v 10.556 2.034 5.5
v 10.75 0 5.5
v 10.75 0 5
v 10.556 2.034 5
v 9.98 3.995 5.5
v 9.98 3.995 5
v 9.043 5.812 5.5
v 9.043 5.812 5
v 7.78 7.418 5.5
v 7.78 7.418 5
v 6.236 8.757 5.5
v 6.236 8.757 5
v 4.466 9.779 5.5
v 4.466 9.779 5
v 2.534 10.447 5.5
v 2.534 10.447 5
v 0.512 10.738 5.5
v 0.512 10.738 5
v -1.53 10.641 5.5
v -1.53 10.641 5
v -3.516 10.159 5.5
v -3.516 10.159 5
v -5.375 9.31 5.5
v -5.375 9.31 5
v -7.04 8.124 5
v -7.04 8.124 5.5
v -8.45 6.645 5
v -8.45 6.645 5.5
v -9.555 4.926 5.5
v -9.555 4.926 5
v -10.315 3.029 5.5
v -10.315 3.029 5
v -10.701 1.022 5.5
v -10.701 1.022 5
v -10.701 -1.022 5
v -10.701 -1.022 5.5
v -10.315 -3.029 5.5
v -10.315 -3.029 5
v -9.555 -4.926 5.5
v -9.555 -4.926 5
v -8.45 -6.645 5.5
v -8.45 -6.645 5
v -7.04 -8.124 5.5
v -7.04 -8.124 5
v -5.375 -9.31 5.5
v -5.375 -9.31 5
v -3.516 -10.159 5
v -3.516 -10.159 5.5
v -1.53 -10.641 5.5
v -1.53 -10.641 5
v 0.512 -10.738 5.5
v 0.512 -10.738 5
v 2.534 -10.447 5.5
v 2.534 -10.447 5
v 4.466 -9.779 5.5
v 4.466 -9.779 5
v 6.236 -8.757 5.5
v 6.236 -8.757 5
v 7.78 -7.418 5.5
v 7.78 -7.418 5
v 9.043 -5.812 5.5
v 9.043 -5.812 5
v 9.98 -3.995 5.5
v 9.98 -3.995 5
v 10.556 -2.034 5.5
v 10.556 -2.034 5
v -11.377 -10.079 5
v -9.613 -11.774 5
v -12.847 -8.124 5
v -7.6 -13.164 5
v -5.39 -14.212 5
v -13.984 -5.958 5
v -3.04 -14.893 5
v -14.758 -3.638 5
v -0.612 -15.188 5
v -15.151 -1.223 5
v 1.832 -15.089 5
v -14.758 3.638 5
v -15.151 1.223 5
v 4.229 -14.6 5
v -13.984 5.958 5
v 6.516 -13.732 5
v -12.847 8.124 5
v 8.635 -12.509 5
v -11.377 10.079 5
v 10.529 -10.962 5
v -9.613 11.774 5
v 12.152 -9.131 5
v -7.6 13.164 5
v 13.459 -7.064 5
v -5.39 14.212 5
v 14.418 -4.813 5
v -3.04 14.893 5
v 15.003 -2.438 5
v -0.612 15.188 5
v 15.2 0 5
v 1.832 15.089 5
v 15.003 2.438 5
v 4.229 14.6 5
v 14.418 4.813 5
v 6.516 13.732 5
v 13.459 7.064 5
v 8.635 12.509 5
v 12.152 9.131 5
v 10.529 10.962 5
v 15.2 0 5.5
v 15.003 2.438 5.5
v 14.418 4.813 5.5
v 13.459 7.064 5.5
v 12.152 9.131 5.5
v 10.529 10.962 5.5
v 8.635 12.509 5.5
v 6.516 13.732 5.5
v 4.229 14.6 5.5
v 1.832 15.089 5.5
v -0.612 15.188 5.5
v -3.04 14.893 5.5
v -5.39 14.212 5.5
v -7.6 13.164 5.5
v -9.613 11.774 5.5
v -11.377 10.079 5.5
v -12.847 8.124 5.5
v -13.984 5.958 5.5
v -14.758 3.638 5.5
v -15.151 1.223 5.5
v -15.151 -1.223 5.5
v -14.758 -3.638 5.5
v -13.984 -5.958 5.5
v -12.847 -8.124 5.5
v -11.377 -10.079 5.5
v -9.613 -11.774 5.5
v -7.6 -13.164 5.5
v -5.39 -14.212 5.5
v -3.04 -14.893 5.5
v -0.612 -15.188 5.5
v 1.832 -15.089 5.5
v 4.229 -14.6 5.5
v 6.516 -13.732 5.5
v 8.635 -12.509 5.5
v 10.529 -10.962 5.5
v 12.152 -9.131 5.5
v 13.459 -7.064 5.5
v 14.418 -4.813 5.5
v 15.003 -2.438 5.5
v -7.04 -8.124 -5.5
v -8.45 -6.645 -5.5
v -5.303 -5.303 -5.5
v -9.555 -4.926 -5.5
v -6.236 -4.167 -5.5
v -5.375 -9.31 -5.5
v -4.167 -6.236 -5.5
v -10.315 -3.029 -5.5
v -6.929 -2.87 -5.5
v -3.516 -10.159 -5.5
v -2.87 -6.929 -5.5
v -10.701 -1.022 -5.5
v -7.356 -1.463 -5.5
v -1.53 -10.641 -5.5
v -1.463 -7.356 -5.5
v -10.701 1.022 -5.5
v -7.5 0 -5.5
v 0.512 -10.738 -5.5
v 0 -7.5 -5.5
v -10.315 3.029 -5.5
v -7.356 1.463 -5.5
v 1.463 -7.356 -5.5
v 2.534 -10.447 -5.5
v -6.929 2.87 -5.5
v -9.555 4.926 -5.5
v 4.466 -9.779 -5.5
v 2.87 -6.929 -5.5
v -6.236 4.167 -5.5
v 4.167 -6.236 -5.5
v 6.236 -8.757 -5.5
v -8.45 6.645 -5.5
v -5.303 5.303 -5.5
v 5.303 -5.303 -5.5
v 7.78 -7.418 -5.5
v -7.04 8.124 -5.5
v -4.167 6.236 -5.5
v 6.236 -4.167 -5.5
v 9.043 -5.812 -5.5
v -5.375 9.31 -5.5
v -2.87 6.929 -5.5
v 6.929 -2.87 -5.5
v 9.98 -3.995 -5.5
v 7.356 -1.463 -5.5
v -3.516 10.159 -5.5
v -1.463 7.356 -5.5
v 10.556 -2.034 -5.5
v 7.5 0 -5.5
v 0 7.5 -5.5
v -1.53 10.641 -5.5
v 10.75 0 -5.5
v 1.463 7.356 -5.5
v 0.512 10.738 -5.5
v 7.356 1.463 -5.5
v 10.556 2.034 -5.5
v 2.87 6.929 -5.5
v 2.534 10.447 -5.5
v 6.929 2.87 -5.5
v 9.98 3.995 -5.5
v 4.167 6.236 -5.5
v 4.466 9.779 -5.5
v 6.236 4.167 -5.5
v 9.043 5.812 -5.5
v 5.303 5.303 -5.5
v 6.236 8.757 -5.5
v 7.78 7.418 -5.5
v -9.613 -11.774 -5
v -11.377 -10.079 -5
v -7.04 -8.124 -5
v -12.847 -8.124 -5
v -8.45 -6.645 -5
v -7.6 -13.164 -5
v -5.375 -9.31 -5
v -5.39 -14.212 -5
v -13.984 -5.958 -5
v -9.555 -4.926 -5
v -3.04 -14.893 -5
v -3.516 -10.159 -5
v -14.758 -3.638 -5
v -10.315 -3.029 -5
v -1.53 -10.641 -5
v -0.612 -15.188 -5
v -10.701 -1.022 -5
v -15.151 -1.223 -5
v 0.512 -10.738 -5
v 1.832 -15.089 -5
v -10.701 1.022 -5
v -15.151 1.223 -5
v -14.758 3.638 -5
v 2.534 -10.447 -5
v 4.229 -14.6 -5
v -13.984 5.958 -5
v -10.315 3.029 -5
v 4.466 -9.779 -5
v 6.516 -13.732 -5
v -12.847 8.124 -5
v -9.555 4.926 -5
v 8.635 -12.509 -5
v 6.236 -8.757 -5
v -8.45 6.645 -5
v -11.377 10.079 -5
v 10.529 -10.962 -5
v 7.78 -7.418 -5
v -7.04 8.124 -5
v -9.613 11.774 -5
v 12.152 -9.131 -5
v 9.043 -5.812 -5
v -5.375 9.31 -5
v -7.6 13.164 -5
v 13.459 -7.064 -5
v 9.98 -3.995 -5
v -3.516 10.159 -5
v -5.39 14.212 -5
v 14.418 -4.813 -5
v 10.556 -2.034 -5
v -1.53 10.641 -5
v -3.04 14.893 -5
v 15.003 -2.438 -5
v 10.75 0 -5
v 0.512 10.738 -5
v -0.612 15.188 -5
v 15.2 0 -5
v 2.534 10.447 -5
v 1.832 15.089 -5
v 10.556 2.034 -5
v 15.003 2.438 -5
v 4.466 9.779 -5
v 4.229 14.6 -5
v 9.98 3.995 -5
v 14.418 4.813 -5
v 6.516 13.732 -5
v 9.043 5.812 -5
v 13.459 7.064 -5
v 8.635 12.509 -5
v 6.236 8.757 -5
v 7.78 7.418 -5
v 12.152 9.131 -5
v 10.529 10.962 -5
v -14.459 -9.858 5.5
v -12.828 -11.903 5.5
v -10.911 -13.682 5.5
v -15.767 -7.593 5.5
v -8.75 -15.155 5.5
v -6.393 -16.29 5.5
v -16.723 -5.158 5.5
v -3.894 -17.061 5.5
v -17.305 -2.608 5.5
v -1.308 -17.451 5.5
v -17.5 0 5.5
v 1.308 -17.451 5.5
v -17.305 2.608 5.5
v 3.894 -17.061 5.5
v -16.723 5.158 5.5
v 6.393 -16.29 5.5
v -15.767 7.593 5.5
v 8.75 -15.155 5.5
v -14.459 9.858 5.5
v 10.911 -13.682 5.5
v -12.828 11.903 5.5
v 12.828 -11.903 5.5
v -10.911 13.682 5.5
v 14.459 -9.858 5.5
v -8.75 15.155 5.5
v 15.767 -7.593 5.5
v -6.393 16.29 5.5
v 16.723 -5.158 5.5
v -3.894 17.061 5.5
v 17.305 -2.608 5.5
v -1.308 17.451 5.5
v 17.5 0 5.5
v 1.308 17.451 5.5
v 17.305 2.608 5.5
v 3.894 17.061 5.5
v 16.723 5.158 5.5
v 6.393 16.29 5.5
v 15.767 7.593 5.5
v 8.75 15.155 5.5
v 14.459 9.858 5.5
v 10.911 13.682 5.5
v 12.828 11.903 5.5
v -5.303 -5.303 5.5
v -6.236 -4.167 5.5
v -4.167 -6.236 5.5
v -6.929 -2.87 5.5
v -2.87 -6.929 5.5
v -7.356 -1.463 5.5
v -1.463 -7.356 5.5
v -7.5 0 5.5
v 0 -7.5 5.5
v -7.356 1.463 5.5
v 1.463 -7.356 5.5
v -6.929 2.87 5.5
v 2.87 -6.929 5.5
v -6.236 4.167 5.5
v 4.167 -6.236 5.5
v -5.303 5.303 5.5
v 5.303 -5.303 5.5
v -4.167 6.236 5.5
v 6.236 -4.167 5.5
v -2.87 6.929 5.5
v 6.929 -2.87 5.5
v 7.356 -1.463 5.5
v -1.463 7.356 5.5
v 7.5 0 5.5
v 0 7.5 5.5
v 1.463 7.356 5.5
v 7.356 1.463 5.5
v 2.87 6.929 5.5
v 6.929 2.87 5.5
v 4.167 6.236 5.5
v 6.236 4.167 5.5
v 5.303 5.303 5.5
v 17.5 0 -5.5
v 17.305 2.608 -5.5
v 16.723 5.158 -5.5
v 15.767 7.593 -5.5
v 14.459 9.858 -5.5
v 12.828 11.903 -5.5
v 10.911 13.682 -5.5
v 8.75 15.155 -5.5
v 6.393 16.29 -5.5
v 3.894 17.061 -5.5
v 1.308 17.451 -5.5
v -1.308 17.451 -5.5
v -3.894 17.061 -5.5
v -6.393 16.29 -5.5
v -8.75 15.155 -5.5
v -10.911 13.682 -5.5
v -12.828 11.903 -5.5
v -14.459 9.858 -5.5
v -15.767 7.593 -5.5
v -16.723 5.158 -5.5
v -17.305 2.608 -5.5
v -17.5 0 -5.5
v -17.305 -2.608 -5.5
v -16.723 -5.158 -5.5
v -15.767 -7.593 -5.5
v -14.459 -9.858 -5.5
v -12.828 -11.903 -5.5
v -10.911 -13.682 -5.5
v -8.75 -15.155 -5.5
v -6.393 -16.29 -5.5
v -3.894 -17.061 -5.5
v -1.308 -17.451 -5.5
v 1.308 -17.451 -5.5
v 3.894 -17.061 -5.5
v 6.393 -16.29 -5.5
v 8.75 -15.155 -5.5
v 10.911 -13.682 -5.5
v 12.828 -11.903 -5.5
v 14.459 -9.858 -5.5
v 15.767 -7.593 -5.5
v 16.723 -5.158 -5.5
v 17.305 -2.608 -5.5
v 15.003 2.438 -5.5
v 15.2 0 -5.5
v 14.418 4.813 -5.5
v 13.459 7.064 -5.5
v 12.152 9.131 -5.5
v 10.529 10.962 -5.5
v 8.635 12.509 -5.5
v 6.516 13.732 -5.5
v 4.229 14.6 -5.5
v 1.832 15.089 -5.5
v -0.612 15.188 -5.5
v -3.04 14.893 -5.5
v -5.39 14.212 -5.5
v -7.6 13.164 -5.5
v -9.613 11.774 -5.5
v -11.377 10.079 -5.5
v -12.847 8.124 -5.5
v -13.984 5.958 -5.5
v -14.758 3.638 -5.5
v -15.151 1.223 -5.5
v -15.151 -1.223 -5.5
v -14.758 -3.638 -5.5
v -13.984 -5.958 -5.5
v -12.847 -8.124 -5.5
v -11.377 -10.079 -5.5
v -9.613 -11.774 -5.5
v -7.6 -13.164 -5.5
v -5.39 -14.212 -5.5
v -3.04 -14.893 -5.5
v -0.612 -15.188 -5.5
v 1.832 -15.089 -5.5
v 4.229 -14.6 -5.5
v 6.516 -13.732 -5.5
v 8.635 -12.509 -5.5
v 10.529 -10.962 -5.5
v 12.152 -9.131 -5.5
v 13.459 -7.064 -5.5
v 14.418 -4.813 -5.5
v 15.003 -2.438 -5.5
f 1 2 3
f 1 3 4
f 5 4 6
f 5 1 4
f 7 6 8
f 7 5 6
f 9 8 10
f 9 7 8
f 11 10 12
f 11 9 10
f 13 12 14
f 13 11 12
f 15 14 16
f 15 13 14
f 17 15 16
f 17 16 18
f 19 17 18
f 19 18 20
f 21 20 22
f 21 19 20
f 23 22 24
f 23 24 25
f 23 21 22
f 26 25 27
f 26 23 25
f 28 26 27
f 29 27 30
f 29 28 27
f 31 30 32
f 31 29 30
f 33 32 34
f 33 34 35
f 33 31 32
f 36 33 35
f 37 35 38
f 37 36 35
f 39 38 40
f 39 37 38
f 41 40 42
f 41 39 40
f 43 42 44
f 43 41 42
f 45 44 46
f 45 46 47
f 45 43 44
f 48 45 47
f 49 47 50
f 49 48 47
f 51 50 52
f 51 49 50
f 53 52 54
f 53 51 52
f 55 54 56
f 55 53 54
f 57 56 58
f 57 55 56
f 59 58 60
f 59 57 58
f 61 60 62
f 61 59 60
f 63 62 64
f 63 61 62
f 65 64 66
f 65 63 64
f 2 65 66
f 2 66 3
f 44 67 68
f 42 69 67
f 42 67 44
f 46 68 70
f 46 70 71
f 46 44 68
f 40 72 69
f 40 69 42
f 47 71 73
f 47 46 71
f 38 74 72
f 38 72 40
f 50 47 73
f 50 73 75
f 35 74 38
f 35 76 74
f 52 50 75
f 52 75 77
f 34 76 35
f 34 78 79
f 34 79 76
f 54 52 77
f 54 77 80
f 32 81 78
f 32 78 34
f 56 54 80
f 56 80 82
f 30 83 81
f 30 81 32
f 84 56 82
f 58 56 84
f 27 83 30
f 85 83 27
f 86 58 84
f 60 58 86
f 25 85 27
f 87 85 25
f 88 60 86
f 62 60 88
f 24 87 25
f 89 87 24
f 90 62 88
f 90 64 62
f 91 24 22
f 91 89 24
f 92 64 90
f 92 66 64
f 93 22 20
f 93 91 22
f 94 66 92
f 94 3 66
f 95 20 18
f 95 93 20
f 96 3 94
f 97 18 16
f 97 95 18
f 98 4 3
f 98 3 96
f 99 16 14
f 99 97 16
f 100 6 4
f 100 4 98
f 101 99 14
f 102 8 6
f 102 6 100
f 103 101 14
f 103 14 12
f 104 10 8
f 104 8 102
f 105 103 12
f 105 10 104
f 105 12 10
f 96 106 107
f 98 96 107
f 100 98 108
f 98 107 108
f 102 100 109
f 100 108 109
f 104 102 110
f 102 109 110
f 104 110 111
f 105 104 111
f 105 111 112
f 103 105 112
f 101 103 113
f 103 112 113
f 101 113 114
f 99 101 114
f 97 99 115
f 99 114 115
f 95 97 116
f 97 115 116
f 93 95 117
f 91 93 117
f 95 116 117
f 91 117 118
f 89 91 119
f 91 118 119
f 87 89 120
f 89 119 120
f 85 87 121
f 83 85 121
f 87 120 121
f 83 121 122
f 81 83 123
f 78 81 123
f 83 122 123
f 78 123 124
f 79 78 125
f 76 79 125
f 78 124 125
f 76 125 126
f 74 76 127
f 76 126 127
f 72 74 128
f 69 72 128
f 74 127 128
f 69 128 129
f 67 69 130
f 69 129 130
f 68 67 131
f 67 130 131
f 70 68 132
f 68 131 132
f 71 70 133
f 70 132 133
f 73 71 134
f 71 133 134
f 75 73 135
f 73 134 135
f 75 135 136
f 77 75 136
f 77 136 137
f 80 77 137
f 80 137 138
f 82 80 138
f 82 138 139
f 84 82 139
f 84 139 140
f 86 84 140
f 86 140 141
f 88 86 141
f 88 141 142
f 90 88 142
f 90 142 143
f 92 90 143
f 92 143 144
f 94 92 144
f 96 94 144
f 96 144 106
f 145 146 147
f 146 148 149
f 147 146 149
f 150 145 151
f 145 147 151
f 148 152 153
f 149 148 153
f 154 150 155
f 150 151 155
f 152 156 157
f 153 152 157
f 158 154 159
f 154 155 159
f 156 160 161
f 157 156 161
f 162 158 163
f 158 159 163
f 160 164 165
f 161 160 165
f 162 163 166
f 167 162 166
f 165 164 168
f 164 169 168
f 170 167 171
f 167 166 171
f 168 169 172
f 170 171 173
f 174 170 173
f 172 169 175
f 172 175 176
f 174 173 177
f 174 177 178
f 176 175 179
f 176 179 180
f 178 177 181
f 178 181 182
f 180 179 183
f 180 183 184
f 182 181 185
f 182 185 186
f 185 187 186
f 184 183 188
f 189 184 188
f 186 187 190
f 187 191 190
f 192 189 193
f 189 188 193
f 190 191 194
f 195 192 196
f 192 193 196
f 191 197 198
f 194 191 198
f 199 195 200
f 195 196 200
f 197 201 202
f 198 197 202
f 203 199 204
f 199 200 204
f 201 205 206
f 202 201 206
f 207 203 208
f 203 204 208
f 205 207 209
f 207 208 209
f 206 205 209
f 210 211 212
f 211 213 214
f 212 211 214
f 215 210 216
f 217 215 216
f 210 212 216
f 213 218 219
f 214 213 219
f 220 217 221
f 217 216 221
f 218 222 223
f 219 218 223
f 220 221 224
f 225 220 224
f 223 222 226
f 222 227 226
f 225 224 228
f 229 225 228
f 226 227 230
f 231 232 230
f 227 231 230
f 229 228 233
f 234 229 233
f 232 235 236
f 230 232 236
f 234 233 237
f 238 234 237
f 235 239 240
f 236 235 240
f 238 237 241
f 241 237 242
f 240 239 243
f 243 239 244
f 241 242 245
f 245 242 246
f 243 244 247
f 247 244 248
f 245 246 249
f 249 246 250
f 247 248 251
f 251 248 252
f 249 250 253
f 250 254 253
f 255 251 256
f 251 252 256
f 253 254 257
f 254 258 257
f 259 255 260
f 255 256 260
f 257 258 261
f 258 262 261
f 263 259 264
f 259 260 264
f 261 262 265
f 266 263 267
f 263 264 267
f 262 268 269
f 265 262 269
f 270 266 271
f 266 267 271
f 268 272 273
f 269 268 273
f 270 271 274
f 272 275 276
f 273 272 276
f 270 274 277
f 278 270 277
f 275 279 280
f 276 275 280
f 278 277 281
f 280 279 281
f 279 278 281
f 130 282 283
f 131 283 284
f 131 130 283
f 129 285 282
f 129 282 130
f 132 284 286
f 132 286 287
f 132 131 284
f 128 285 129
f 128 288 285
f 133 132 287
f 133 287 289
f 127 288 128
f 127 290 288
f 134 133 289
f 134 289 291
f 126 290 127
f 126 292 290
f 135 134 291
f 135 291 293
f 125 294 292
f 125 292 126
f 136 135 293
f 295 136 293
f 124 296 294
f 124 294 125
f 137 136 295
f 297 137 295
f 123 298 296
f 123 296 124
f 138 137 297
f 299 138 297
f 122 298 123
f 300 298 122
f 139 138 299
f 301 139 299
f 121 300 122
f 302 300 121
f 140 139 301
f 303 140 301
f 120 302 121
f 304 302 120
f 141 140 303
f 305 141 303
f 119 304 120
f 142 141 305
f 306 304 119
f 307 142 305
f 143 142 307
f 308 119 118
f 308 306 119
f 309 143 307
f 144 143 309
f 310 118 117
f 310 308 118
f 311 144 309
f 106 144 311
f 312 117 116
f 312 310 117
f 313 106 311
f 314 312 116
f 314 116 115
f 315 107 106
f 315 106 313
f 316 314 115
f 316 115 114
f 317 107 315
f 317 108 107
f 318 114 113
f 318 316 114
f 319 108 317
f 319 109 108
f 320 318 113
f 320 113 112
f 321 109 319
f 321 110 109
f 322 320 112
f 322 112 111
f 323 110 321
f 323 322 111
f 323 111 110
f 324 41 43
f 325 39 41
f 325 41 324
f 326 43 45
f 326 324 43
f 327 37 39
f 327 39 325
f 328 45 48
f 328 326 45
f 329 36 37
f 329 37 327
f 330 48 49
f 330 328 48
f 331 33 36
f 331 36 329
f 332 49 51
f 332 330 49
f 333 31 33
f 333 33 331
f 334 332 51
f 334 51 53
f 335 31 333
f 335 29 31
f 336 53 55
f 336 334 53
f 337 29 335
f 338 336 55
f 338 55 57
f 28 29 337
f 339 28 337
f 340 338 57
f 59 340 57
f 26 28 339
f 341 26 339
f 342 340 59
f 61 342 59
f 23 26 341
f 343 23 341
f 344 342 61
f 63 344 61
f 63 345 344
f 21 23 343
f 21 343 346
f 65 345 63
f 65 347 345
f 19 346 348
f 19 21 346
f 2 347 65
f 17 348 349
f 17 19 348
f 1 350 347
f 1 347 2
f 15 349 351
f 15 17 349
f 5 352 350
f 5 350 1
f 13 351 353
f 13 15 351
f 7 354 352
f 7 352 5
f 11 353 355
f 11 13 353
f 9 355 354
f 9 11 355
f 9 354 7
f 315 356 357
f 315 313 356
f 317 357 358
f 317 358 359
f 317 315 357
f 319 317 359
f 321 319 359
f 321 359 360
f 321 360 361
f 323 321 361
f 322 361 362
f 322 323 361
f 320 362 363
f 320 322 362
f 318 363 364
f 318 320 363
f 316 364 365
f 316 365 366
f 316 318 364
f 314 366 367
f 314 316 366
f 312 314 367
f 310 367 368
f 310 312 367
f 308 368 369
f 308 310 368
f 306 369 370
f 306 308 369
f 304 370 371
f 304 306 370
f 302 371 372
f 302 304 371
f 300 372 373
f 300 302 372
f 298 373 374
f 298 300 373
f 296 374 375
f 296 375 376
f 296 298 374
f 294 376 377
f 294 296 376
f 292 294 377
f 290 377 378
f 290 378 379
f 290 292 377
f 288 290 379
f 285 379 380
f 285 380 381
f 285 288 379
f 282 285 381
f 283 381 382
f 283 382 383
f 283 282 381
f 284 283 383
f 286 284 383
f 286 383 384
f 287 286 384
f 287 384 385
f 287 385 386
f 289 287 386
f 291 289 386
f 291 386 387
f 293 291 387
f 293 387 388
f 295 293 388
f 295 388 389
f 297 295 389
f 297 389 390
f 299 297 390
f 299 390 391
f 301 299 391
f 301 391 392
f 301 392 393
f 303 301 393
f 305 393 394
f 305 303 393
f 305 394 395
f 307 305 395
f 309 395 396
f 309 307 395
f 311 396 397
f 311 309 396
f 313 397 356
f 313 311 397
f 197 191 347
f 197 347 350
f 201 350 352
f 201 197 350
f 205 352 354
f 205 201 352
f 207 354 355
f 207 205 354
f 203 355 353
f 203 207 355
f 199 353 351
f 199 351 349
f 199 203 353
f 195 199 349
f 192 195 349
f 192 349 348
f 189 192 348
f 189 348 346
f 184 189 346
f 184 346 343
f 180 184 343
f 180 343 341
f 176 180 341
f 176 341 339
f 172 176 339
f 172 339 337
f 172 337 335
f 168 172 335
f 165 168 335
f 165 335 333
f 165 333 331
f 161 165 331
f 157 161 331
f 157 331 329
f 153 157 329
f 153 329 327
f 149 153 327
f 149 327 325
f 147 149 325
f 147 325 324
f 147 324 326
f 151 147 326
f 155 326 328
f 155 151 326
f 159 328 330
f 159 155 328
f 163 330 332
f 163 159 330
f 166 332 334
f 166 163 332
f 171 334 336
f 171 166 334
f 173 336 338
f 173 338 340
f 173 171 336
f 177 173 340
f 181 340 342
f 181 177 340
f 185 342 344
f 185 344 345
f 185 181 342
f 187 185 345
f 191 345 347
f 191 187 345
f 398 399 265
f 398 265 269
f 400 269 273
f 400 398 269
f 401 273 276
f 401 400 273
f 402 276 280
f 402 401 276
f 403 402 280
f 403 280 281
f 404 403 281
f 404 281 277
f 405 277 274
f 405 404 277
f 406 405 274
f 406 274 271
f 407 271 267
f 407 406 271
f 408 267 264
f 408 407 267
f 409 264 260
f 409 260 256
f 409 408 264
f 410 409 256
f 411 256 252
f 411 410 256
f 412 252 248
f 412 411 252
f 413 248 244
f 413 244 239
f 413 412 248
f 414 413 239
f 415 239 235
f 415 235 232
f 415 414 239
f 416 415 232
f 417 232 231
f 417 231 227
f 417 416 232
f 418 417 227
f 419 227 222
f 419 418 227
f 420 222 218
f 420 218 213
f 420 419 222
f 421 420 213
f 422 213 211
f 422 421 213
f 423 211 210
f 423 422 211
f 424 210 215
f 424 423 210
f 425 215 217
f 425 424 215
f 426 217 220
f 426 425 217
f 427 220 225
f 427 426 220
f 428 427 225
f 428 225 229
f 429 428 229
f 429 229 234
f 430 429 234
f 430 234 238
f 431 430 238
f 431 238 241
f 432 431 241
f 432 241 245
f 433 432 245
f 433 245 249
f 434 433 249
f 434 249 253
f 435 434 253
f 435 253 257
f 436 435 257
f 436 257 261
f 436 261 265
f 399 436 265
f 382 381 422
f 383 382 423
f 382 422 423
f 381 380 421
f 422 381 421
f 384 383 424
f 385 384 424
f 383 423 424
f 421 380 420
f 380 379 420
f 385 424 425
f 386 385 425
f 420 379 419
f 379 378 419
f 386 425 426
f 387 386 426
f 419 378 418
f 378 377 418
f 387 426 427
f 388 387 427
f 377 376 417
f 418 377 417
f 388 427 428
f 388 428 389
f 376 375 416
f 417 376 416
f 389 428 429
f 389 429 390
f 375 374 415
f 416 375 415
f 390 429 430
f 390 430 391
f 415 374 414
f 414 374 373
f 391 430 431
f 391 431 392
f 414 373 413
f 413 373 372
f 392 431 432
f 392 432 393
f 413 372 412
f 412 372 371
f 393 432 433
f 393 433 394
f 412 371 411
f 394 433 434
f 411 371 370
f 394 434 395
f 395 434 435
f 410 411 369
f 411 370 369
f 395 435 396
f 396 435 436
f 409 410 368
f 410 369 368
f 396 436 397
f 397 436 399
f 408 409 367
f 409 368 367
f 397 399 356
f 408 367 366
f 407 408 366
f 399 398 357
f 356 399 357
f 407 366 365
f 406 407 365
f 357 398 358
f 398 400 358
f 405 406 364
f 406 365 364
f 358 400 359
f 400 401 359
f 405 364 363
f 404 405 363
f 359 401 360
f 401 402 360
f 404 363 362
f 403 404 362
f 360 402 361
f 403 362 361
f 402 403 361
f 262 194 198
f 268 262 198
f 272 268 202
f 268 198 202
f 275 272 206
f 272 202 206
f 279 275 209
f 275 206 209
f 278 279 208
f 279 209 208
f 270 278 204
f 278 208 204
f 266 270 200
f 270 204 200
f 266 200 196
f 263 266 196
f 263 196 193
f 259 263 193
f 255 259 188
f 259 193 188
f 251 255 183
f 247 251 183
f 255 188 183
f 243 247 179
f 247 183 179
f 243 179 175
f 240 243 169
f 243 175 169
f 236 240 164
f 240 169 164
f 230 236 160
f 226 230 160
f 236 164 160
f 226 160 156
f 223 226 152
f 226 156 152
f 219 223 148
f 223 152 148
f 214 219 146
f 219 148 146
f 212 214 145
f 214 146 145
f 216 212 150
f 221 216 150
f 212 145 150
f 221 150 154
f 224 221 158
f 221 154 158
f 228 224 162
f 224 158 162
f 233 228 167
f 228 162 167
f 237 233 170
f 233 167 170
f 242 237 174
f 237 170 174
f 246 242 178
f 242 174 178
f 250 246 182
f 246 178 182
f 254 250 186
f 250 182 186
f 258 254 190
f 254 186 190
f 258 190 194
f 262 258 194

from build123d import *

# Parameters (mm, degrees)
F0_R     = 17.5
F1_DEPTH = 5.5
F2_R     = 7.5
F3_DEPTH = 25
F4_R     = 15.2
F4_R_2   = 10.75
F5_DEPTH = 0.5


with BuildPart() as f1:
    # F0 (on Top) → F1 (new body)
    with BuildSketch(Plane.XY):
        Circle(F0_R)
    extrude(amount=F1_DEPTH)

    # F2 (on face) → F3 (cut)
    with BuildSketch(Plane.XY.offset(5.5)):
        Circle(F2_R)
    extrude(amount=-F3_DEPTH, mode=Mode.SUBTRACT)

    # F4 (on face) → F5 (cut)
    with BuildSketch(Plane.XY.offset(5.5)):
        Circle(F4_R)
        Circle(F4_R_2, mode=Mode.SUBTRACT)
    extrude(amount=-F5_DEPTH, mode=Mode.SUBTRACT)

    # F6: F1 across plane


with BuildPart() as f1_1:
    add(f1.part)
    add(f1.part.mirror(Plane.XY))


solid = f1_1.part
